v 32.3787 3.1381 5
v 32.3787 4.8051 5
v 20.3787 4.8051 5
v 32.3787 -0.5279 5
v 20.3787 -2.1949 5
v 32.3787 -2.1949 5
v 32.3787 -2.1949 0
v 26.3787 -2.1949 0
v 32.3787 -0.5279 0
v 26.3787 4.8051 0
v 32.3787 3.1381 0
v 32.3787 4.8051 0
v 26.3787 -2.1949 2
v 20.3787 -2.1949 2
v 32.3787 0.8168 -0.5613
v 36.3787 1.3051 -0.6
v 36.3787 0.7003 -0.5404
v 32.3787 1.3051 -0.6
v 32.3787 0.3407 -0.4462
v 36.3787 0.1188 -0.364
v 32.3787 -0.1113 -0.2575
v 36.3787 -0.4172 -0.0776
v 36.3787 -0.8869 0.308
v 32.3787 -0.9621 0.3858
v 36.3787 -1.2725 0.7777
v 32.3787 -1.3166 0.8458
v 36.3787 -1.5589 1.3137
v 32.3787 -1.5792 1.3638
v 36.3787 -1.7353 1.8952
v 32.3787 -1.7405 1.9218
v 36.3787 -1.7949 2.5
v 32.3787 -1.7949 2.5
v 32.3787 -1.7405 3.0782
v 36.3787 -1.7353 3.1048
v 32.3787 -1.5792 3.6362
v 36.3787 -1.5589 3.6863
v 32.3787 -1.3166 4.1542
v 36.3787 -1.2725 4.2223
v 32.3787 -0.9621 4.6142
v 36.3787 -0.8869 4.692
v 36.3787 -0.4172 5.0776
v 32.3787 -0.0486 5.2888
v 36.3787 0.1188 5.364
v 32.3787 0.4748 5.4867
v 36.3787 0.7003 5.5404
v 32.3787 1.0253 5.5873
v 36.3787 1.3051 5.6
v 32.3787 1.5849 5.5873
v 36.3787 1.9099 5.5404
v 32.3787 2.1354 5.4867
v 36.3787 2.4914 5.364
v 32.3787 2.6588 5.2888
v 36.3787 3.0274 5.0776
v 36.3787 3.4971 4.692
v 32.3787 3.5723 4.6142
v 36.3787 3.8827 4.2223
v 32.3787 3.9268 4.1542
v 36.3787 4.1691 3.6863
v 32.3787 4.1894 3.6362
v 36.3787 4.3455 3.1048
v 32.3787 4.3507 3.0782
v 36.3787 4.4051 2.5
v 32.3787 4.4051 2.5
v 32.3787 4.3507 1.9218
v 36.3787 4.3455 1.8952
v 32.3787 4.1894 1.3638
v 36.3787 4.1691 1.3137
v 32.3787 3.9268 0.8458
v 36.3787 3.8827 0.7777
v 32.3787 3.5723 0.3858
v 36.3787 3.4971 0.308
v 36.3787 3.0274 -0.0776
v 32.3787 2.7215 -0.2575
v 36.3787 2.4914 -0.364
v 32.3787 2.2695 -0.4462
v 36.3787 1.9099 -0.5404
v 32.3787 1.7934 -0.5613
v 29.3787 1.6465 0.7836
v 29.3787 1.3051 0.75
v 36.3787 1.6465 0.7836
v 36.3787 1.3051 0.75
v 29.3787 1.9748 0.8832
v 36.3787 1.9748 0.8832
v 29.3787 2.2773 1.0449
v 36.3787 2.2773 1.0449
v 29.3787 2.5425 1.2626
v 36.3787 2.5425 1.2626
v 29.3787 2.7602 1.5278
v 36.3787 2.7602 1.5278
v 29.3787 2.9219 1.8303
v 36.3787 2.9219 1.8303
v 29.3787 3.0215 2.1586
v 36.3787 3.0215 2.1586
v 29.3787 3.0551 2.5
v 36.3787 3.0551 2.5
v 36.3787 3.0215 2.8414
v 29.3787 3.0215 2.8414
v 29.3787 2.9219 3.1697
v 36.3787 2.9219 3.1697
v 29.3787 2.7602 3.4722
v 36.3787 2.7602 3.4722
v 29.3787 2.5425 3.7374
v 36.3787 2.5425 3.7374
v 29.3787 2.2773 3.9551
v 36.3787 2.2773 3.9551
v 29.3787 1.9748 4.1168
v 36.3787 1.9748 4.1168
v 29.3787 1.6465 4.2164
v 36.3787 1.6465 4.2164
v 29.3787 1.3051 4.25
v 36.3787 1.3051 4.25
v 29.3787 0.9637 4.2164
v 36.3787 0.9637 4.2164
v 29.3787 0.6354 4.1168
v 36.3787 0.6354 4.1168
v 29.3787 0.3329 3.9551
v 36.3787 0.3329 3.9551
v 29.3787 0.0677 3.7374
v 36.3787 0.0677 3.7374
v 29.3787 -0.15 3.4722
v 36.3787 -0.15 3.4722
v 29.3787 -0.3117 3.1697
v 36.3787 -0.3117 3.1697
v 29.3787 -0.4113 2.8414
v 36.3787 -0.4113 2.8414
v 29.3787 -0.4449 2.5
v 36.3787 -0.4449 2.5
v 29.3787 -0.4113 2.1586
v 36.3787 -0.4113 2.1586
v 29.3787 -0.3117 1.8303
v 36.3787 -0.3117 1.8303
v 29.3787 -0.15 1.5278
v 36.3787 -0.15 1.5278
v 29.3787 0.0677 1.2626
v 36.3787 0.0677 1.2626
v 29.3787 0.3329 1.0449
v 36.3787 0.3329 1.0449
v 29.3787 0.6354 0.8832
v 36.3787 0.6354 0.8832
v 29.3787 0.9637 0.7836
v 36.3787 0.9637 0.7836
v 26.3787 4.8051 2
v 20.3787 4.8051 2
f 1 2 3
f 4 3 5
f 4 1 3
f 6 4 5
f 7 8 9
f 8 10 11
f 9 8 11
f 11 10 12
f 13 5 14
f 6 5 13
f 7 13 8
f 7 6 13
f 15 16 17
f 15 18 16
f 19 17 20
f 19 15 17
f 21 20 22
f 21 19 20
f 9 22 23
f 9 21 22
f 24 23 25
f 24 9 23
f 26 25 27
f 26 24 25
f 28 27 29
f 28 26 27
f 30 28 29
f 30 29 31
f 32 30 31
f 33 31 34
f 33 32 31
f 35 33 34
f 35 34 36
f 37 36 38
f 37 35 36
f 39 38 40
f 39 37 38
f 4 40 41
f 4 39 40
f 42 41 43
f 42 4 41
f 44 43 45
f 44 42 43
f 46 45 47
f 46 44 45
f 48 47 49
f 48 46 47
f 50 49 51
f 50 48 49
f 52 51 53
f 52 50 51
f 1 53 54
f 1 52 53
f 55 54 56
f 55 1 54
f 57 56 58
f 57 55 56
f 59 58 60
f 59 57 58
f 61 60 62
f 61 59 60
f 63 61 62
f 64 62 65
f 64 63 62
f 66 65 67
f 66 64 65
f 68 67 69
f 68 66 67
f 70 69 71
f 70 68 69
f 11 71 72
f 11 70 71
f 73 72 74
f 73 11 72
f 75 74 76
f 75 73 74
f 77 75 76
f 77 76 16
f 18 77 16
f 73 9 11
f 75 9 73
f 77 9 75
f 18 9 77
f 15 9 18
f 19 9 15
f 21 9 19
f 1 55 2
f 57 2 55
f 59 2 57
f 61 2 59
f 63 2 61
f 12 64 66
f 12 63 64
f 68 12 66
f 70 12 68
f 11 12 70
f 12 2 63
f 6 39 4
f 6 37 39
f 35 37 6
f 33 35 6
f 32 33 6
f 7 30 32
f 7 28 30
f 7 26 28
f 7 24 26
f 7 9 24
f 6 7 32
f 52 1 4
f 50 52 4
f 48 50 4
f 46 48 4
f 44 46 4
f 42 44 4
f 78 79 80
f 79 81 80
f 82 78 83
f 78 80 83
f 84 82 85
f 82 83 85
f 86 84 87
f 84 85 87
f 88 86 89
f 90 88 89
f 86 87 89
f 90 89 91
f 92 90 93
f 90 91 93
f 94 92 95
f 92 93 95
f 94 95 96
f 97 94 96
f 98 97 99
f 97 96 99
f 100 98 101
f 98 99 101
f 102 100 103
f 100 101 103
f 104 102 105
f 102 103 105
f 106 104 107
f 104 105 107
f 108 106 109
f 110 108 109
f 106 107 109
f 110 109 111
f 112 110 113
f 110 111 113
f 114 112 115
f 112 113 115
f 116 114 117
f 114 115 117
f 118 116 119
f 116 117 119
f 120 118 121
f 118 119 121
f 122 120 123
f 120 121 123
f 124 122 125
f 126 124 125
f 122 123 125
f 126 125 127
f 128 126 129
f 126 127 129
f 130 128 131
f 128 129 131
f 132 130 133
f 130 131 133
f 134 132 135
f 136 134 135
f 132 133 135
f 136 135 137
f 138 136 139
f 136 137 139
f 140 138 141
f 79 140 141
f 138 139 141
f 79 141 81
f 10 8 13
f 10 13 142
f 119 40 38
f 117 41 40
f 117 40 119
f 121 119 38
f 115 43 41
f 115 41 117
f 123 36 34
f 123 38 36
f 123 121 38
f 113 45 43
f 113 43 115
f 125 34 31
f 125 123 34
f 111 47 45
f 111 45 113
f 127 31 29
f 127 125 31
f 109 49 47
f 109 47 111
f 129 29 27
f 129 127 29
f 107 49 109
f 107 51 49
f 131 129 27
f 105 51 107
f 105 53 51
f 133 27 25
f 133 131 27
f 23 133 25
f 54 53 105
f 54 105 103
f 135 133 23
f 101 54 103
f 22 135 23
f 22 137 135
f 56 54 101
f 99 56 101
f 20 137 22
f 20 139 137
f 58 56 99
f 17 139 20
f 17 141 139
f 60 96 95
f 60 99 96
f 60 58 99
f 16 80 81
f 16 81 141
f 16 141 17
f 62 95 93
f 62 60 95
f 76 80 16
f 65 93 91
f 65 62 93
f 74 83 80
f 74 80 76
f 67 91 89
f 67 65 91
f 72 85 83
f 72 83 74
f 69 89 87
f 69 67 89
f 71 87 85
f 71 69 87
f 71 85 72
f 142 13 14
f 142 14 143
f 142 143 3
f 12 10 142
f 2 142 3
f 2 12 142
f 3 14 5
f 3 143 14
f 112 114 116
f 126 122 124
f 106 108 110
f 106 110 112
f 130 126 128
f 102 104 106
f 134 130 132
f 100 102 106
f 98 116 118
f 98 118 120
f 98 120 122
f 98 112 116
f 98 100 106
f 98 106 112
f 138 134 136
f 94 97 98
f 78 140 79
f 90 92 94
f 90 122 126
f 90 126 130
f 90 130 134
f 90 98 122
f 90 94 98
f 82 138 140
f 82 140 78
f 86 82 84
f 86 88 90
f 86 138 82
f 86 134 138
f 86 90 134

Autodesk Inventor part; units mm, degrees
ref_plane "YZ Plane" through (0, 0, 0) normal (1, 0, 0) x (0, 1, 0)
ref_plane "XZ Plane" through (0, 0, 0) normal (0, 1, 0) x (-1, 0, 0)
ref_plane "Work Plane1" through (0, 0, 0) normal (0, 0, 1) x (1, 0, 0)
sketch "Sketch1" plane through (0, 0, 0) normal (0, 0, 1) x (1, 0, 0)
  line L0 (26.3787, 4.8051) -> (32.3787, 4.8051)
  line L1 (32.3787, 4.8051) -> (32.3787, -2.1949)
  line L2 (32.3787, -2.1949) -> (26.3787, -2.1949)
  line L3 (26.3787, -2.1949) -> (26.3787, 4.8051)
  point P0 (0, 0)
  dimension "d0" = 6
  dimension "d2" = 7
extrude "Extrusion1" add sketch "Sketch1" along normal blind 5
sketch "Sketch2" plane through (32.3787, -2.1949, 0) normal (1, 0, 0) x (0, 0, -1)
  circle A0 centre (-2.5, 3.5) radius 3.1
  line L0 (0, 7) -> (-5, 7) projected
  line L1 (0, 0) -> (-5, 0) projected
  line L2 (-2.5, 3.5) -> (-2.5, 7)
  line L3 (-2.5, 3.5) -> (-2.5, 0)
  point P0 (0, 2.1949)
  dimension "d5" = 6.2
extrude "Extrusion2" add sketch "Sketch2" along normal blind 4
sketch "Sketch3" plane through (36.3787, 1.3051, 2.5) normal (1, 0, 0) x (0, 0, -1)
  circle A0 centre (0, 0) radius 3.1 projected
  circle A1 centre (0, 0) radius 1.75
  point P0 (2.5, -1.3051)
  dimension "d9" = 3.5
extrude "Extrusion3" cut sketch "Sketch3" against normal blind 7 contours A1
sketch "Sketch4" plane through (26.3787, -2.1949, 0) normal (-1, 0, 0) x (0, 0, 1)
  line L0 (0, 7) -> (5, 7) projected
  line L1 (5, 0) -> (2, 0)
  line L2 (2, 0) -> (2, 7)
  line L3 (2, 7) -> (5, 7)
  line L4 (5, 7) -> (5, 0)
  point P0 (0, 2.1949)
  dimension "d13" = 3
extrude "Extrusion4" add sketch "Sketch4" along normal blind 6
properties part number "nanopc_t4_headphone"
